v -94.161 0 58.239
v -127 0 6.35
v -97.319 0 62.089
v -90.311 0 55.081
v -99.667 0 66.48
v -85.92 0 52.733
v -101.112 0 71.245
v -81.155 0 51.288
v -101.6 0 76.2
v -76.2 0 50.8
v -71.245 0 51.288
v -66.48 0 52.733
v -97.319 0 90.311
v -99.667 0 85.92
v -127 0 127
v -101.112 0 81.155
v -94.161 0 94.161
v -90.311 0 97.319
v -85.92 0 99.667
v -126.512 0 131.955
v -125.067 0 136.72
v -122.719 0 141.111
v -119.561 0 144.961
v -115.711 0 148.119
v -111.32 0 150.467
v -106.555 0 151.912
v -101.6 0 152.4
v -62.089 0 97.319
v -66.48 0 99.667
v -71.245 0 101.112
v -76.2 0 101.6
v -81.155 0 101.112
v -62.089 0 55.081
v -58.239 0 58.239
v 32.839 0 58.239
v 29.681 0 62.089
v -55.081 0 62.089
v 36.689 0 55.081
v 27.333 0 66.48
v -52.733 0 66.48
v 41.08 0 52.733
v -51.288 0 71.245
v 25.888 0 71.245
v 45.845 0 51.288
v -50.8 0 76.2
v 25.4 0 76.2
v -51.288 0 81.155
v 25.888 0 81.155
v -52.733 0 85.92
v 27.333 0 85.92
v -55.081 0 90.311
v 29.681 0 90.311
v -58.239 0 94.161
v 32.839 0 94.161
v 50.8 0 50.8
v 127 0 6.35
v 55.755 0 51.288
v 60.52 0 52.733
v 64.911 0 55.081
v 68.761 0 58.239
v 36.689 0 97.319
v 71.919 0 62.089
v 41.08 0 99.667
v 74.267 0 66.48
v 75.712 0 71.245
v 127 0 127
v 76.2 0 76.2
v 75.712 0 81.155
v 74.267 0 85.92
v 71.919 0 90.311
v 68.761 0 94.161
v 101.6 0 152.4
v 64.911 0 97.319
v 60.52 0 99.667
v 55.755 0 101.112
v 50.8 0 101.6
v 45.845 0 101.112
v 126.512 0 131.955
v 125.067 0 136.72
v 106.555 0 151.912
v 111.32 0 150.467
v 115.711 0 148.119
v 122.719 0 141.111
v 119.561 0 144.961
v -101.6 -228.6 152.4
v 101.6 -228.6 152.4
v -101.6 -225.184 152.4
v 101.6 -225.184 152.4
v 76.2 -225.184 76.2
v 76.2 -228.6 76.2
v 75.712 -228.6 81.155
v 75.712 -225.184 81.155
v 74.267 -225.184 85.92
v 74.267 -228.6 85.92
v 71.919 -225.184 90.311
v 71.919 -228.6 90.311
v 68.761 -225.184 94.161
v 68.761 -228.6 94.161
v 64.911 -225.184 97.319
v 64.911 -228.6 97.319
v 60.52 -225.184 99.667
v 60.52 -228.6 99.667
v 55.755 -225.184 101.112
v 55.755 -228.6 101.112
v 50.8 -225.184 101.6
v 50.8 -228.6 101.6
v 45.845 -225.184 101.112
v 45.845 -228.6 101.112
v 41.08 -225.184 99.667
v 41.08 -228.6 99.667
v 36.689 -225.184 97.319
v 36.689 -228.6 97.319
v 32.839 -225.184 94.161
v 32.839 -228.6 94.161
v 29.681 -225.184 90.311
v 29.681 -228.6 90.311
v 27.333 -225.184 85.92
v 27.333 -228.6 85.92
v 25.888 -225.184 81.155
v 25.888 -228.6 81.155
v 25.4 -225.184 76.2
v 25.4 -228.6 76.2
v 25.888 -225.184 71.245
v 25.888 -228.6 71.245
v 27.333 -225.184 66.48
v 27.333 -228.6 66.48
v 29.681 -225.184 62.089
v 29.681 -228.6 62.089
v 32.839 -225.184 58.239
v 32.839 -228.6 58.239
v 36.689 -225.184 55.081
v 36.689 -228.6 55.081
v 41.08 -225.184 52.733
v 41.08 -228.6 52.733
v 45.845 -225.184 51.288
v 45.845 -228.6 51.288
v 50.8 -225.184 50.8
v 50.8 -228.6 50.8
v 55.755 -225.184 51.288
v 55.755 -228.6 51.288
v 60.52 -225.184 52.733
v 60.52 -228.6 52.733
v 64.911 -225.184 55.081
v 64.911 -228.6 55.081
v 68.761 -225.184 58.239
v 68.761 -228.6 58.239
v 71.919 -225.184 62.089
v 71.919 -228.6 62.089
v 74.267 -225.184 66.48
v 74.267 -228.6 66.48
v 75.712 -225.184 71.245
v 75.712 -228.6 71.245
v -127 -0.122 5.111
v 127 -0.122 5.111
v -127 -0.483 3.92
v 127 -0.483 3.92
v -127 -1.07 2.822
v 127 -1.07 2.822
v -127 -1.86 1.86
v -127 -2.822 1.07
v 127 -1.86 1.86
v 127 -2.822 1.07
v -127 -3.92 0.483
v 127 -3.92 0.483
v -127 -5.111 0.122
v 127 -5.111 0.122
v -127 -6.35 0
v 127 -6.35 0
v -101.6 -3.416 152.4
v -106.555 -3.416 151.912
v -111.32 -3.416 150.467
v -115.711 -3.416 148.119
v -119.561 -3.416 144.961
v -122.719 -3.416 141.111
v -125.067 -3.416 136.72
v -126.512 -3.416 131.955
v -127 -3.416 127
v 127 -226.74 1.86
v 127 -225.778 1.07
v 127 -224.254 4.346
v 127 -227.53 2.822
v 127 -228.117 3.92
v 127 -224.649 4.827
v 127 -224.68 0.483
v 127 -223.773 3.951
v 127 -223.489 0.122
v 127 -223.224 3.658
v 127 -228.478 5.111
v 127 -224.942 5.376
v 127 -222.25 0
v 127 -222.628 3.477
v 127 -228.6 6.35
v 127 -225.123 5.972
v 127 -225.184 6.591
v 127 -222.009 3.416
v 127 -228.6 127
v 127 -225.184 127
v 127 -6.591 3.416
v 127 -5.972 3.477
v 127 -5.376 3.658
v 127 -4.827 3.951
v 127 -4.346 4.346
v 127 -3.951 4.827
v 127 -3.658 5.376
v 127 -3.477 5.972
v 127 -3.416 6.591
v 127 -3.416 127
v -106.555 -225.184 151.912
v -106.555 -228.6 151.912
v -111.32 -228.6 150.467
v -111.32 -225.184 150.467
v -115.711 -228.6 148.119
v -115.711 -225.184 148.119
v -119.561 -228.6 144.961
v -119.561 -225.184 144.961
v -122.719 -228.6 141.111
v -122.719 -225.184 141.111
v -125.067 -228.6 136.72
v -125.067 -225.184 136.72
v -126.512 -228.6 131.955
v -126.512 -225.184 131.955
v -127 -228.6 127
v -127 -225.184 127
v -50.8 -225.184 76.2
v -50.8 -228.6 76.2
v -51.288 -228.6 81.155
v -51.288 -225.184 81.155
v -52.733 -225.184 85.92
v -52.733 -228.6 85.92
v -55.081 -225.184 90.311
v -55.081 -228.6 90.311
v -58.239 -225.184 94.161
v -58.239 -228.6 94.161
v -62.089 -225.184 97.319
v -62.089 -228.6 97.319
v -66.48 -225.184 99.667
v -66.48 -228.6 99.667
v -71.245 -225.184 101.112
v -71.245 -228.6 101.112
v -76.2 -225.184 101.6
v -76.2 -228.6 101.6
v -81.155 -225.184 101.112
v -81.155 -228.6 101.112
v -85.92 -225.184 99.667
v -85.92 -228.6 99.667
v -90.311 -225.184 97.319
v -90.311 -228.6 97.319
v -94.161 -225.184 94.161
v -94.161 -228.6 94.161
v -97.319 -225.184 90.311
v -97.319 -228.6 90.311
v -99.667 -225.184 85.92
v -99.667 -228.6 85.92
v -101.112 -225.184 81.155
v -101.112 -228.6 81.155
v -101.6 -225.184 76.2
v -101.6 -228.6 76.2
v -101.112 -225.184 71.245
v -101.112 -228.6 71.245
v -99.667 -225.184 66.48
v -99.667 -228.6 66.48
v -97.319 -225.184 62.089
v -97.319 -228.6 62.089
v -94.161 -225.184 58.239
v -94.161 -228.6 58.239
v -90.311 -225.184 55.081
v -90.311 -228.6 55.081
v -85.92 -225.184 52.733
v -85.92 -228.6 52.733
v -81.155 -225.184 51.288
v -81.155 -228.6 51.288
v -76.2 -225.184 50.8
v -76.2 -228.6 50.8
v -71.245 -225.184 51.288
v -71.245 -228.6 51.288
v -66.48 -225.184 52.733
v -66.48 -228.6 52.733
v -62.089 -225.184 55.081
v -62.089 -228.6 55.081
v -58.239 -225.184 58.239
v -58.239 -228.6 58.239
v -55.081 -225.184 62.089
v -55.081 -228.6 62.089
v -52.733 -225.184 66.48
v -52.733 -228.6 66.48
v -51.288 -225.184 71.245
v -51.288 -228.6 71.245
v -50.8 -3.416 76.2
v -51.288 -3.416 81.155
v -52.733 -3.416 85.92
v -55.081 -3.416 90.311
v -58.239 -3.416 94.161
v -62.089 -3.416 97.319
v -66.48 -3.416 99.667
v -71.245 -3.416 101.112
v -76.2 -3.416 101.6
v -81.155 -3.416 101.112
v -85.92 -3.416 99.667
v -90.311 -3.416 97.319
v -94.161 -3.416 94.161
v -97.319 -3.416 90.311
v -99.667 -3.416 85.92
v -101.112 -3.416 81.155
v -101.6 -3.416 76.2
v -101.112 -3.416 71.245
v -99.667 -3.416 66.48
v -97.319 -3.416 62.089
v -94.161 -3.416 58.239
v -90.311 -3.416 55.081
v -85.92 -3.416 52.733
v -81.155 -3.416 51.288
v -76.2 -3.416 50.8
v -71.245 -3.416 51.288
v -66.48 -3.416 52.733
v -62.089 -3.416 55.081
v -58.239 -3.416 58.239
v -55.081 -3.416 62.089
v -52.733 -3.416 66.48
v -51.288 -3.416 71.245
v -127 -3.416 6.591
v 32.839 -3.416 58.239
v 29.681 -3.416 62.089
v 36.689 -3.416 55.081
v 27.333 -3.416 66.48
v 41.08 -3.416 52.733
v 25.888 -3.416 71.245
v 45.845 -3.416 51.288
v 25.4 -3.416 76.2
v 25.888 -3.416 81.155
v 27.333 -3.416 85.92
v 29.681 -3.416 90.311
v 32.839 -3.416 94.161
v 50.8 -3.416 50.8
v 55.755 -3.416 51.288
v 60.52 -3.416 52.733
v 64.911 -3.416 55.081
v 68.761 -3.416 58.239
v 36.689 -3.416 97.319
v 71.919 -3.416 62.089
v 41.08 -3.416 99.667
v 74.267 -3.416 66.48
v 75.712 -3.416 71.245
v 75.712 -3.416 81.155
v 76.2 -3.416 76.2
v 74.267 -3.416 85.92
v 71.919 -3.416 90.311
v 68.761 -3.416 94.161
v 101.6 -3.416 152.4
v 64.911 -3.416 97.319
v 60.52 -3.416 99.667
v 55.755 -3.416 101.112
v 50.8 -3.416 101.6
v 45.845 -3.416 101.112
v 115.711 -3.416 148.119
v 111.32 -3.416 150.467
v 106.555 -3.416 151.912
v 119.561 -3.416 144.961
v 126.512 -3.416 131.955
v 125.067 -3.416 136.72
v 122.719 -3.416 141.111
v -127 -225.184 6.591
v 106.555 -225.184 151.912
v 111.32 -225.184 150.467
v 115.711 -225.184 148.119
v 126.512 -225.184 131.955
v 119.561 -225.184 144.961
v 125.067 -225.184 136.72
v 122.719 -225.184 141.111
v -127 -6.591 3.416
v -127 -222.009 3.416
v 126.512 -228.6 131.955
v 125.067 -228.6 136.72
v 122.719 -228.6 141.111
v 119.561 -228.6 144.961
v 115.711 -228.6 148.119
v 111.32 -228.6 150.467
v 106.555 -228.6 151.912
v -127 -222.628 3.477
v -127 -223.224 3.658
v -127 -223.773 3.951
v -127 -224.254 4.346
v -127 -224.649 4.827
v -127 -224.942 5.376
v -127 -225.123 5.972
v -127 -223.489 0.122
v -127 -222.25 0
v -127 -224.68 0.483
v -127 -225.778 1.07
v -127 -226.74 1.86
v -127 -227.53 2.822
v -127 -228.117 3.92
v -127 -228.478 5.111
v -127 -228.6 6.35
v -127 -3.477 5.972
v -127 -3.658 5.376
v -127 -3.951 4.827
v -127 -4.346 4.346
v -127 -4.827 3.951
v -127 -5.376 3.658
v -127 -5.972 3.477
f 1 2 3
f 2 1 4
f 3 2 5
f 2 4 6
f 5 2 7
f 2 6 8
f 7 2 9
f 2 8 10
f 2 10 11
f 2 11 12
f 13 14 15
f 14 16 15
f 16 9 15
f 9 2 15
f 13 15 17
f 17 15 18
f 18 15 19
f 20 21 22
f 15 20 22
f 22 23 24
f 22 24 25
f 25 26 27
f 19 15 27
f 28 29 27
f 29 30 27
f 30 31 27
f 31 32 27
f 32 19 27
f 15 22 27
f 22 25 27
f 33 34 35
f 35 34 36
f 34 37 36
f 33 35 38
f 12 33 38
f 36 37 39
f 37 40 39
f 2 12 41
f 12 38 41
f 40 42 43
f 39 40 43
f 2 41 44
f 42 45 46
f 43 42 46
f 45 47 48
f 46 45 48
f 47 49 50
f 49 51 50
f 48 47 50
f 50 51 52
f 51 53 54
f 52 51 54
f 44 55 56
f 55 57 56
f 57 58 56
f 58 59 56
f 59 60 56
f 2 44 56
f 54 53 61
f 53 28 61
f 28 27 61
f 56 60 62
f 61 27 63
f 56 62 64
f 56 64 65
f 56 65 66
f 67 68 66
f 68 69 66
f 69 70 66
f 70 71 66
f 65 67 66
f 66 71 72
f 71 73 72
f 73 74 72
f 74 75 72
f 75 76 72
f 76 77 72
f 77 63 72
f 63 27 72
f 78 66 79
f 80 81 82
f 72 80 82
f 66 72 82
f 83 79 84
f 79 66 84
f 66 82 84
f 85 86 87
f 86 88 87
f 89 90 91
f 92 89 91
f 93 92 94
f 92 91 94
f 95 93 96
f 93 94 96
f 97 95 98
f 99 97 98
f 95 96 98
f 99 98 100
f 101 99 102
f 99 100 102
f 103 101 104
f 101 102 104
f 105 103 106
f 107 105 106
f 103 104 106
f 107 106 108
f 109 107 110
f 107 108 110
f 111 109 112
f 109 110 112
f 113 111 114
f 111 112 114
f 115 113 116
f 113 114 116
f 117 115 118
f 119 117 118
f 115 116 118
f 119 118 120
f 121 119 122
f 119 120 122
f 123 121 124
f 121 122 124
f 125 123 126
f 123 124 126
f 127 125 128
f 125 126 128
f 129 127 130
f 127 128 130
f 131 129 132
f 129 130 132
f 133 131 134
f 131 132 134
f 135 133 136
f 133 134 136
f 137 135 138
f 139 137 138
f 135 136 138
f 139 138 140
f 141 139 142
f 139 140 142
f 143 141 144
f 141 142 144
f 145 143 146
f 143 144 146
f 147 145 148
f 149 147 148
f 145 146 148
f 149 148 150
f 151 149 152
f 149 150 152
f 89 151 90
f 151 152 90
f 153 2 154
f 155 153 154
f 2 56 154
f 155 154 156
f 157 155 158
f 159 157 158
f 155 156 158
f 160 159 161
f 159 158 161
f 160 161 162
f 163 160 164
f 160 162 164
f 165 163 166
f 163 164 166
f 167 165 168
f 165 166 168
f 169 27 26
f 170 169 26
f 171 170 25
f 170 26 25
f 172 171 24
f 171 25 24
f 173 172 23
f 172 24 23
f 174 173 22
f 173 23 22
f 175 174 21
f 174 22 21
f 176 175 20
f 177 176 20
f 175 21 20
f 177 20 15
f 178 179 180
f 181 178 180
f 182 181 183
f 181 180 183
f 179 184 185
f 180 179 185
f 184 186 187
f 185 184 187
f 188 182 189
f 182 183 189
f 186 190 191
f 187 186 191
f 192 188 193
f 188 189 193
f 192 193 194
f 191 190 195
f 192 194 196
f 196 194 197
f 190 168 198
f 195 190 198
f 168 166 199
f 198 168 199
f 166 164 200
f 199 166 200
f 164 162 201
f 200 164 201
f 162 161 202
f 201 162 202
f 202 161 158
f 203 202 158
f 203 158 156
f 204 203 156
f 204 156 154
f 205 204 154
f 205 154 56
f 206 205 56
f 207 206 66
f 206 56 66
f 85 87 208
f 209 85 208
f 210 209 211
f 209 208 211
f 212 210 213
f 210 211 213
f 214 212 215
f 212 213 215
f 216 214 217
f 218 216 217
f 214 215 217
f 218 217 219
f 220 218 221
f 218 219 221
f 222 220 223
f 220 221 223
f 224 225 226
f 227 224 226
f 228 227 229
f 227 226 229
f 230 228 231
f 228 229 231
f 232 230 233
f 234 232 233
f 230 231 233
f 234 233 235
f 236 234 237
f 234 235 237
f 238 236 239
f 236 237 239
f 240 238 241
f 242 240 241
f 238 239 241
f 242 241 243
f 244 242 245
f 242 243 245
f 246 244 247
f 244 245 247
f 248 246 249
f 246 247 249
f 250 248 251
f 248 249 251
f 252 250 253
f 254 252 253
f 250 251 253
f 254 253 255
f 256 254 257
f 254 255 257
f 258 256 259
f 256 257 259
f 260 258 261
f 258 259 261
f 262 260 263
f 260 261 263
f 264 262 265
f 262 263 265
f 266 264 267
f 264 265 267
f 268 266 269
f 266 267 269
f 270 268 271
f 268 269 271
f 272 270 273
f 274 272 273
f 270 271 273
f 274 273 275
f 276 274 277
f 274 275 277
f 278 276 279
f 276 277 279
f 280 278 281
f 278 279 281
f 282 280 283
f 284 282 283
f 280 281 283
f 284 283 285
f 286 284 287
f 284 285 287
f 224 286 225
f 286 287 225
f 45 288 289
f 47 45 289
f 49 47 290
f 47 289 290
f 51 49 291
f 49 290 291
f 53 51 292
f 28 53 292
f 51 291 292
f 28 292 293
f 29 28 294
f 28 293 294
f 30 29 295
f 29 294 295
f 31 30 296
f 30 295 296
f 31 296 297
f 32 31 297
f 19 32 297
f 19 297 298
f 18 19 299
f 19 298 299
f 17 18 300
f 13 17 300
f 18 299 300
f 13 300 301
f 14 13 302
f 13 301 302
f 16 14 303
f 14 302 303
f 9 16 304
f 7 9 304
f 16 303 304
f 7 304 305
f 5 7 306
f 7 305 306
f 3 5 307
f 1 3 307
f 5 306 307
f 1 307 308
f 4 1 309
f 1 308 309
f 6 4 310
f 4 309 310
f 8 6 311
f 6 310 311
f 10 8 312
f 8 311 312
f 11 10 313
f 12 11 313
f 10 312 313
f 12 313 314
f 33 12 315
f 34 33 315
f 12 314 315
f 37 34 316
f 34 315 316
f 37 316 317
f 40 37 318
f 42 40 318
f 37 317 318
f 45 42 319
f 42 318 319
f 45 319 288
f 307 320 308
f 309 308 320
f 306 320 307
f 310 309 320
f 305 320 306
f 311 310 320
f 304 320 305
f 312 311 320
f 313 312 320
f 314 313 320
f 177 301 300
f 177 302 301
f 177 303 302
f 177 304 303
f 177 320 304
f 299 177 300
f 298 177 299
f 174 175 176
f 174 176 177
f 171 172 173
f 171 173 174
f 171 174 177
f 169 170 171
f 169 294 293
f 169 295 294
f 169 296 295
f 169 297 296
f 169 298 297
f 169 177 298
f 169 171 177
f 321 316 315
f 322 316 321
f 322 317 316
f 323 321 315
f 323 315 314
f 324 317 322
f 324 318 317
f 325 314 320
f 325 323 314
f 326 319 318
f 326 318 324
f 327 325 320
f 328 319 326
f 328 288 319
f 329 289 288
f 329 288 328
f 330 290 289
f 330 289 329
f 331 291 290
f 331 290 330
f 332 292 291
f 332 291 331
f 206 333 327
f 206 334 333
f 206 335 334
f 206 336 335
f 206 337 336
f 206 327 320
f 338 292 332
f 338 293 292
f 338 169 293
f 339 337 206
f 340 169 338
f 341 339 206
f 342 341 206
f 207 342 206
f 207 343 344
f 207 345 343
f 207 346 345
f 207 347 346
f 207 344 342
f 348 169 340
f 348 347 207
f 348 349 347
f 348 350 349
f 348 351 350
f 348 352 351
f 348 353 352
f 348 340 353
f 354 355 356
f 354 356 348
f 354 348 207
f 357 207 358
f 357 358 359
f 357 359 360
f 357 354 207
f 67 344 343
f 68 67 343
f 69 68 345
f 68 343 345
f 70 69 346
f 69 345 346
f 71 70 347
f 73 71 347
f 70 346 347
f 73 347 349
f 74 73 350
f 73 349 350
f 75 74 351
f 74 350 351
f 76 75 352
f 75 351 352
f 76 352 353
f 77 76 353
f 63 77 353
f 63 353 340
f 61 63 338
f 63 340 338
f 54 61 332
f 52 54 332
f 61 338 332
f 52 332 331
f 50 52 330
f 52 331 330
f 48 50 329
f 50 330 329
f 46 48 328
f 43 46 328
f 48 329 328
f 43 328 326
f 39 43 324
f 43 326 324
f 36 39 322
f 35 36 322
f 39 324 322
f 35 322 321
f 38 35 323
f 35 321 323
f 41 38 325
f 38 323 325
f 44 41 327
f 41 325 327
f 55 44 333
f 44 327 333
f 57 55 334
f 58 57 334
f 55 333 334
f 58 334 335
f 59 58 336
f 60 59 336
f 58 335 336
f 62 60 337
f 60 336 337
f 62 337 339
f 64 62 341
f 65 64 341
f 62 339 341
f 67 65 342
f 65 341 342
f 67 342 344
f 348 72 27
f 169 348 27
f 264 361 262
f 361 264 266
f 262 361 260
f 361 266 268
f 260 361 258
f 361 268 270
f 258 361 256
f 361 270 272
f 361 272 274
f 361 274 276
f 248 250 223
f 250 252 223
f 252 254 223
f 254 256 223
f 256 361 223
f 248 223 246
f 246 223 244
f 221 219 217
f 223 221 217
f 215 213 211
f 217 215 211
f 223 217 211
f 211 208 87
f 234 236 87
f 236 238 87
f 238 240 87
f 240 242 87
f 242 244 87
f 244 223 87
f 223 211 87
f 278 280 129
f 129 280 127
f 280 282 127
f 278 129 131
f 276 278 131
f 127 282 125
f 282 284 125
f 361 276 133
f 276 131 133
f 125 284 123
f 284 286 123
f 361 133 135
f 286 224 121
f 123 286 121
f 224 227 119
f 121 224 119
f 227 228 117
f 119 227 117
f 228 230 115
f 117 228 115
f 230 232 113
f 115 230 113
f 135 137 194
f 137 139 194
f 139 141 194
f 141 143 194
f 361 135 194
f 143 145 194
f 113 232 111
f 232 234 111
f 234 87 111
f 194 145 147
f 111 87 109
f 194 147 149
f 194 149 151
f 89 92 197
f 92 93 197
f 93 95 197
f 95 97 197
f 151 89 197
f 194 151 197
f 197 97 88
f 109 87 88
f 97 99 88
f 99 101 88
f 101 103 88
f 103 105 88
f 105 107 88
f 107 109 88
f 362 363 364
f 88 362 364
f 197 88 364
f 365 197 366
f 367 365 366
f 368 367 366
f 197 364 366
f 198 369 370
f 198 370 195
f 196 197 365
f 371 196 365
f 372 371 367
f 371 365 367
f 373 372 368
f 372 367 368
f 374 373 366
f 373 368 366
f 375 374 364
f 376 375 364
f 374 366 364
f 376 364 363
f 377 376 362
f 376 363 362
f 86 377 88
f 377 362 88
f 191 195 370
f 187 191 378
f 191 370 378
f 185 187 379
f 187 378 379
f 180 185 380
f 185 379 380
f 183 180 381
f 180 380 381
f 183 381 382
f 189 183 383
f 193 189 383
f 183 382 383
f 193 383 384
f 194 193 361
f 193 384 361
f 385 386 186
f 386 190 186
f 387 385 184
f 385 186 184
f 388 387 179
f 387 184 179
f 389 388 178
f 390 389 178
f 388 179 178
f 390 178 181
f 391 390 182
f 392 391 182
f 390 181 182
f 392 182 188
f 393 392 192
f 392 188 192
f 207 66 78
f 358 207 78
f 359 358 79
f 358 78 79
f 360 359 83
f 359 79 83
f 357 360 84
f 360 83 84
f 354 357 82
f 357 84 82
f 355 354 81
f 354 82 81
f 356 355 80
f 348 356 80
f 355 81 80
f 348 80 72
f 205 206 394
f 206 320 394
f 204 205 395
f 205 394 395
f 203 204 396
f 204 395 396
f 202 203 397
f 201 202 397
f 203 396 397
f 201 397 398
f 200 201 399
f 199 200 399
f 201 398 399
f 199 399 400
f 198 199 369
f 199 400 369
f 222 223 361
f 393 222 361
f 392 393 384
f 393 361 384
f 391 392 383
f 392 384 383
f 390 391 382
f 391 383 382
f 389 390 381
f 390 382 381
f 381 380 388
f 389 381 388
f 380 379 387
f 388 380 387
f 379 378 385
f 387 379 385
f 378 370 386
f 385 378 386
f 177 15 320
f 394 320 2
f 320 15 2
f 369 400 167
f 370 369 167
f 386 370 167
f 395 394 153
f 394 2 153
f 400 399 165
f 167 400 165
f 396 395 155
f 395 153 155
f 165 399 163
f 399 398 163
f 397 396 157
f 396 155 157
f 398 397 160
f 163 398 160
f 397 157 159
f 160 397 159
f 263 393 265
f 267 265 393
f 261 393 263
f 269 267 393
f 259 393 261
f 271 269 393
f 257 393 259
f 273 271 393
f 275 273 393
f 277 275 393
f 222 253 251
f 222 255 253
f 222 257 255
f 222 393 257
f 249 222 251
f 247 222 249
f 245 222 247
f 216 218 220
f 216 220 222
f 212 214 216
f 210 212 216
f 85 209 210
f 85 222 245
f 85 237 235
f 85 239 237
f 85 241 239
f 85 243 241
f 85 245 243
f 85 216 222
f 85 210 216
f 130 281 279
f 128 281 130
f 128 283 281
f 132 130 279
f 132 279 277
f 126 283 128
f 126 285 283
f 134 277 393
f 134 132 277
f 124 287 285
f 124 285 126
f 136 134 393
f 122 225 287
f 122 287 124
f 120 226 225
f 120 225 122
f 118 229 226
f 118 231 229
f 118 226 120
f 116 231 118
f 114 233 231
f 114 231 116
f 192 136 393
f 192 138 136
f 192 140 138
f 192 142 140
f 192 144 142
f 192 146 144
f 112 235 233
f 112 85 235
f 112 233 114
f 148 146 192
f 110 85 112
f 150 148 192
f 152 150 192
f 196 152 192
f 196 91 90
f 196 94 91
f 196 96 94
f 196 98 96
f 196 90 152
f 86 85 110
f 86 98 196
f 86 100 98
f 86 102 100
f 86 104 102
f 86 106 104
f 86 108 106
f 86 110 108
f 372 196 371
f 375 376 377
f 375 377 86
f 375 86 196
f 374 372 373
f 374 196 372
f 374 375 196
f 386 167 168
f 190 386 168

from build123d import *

# Parameters (mm, degrees)
F1_DEPTH = 228.6
F2_R     = 25.4
F3_DEPTH = 228.601
F4_T     = -3.4163
F5_R     = 6.35
F6_R     = 3.175


with BuildPart() as f1:
    # F0 (on Front) → F1 (new body)
    with BuildSketch(Plane.XZ):
        with BuildLine():
            Line((101.6, 152.4), (-101.6, 152.4))
            ThreePointArc((-101.6, 152.4), (-119.5605122421, 144.9605122421), (-127, 127))
            Line((-127, 127), (-127, 0))
            Line((-127, 0), (127, 0))
            Line((127, 0), (127, 127))
            ThreePointArc((127, 127), (119.5605122421, 144.9605122421), (101.6, 152.4))
        make_face()
    extrude(amount=F1_DEPTH)

    # F2 (on face) → F3 (cut, through all)
    with BuildSketch(Plane.XZ.offset(228.6)):
        with Locations((-76.2, 76.2)):
            Circle(F2_R)
        with Locations((50.8, 76.2)):
            Circle(F2_R)
    extrude(amount=-F3_DEPTH, mode=Mode.SUBTRACT)

    # F4
    f4_openings = [f1.faces().sort_by_distance(p)[0] for p in [
        (127, -114.3, 63.5),
        (119.560512, -114.3, 144.960512),
        (0, -114.3, 152.4),
        (-127, -114.3, 63.5),
        (-119.560512, -114.3, 144.960512),
        (-101.6, -114.3, 76.2),
        (25.4, -114.3, 76.2),
    ]]
    offset(amount=F4_T, openings=f4_openings)

    # F5
    f5_edges = [f1.edges().sort_by_distance(p)[0] for p in [
        (0, 0, 0),
        (0, -228.6, 0),
    ]]
    fillet(f5_edges, radius=F5_R)

    # F6
    f6_edges = [f1.edges().sort_by_distance(p)[0] for p in [
        (0, -3.4163, 3.4163),
        (0, -225.1837, 3.4163),
    ]]
    fillet(f6_edges, radius=F6_R)


solid = f1.part
